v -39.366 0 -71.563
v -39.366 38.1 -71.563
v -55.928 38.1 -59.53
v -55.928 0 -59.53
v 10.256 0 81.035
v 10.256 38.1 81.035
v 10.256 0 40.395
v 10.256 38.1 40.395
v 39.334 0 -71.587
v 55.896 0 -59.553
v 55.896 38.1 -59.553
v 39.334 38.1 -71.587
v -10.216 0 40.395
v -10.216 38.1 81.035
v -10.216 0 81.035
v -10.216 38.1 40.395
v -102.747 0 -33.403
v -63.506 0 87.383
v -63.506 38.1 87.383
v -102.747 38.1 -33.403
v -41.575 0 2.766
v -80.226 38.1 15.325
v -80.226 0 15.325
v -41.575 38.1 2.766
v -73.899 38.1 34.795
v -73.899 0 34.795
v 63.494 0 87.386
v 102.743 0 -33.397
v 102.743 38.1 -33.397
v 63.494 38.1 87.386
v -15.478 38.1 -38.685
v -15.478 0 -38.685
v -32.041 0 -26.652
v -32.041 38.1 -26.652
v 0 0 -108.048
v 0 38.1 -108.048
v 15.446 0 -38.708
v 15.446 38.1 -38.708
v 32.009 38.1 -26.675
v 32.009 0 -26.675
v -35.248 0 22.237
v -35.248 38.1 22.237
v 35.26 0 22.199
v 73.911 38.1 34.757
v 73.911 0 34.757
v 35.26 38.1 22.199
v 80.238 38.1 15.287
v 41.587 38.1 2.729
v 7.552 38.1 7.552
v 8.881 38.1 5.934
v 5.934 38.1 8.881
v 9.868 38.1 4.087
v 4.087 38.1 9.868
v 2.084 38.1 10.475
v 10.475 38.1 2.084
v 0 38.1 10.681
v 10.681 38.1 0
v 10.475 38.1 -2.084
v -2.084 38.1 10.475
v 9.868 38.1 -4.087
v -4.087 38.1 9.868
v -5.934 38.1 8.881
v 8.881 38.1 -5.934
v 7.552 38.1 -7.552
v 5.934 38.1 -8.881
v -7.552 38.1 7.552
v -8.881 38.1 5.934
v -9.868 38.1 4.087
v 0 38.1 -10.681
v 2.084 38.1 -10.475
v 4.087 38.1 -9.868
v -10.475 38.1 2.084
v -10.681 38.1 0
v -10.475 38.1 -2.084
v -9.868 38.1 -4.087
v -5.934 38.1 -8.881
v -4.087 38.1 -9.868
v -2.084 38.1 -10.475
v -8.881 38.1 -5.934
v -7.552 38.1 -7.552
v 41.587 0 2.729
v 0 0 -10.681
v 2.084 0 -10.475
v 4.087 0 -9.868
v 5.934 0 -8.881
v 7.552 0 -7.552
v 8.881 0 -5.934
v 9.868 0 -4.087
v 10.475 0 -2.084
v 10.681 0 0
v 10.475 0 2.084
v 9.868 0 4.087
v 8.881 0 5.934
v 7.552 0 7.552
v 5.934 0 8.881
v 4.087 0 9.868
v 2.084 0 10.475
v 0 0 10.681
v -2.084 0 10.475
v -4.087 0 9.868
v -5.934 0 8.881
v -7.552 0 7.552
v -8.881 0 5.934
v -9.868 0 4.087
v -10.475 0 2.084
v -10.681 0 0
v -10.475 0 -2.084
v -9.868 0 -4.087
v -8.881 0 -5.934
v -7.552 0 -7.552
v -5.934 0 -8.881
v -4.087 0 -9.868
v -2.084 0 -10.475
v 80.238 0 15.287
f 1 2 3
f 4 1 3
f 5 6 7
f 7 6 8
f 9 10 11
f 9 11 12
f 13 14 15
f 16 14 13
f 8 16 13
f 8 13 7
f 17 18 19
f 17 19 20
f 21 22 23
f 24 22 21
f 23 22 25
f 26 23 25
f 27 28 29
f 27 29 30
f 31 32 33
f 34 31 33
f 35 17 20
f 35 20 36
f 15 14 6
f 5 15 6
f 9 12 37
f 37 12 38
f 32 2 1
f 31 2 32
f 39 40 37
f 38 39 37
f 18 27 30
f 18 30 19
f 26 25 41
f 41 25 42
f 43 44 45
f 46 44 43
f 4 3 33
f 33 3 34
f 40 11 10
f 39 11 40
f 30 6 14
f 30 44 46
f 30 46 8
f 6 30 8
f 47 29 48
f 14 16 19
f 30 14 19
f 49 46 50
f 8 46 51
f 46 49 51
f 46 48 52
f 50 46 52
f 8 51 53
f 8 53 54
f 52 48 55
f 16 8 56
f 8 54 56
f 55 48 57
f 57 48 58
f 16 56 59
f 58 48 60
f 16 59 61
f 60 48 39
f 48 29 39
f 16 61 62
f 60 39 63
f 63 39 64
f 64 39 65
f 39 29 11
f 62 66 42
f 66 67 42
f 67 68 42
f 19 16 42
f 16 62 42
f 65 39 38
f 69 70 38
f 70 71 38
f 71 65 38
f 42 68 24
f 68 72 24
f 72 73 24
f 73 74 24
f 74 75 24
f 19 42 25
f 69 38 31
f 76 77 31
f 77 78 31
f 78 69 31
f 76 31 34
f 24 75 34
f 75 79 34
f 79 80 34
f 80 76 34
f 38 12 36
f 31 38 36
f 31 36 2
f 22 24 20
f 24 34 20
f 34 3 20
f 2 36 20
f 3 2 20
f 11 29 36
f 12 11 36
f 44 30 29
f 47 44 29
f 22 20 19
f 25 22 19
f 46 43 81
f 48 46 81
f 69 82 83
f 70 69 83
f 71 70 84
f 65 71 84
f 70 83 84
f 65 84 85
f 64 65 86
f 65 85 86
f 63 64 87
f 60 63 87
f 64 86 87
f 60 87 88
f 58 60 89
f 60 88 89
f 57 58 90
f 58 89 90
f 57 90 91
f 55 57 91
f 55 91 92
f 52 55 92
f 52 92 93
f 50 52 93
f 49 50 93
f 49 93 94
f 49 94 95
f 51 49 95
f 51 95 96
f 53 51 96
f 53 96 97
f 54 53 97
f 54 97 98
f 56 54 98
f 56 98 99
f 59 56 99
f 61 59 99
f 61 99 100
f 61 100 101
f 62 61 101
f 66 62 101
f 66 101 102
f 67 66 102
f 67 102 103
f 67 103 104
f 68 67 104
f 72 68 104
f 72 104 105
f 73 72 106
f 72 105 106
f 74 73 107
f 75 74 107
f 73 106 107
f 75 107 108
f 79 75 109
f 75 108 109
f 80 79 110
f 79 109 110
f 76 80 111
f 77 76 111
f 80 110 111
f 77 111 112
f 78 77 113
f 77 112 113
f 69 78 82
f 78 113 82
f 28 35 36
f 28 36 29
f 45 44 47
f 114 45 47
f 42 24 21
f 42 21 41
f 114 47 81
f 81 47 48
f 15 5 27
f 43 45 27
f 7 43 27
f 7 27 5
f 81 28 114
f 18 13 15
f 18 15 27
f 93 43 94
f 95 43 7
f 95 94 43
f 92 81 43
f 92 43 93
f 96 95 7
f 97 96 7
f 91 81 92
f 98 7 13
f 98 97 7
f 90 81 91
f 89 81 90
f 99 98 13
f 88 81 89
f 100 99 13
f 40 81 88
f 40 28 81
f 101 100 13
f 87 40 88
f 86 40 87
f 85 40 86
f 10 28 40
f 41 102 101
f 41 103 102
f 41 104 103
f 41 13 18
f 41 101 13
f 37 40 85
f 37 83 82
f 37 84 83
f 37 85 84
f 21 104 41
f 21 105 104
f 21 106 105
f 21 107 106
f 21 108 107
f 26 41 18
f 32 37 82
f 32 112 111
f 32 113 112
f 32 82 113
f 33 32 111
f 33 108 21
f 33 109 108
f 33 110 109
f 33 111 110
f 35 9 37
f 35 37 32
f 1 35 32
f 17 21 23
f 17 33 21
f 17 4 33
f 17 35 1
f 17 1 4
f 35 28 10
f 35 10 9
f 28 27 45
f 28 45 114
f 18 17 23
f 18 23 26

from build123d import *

# Parameters (mm, degrees)
BOSS_EXTRUDE2_DEPTH = 38.1
SKETCH5_W           = 20.4724
SKETCH5_H           = 40.64
CUT_EXTRUDE2_DEPTH  = 154.893000964
CIRPATTERN1_COUNT   = 5
SKETCH6_R           = 10.680701414
CUT_EXTRUDE3_DEPTH  = 154.893000964


with BuildPart() as part:
    # Sketch4 → Boss-Extrude2 (new body)
    with BuildSketch(Plane(origin=(0, 0, 0), x_dir=(1, 0, 0), z_dir=(0, 1, 0))):
        Polygon((-102.747316485, 33.402541556), (0, 108.048298), (102.743, 33.396600424), (63.494349621, -87.38644244), (-63.505650326, -87.382770618), align=None)
    extrude(amount=BOSS_EXTRUDE2_DEPTH)

    # Sketch5 → Cut-Extrude2 (cut, through all)
    with BuildSketch(Plane(origin=(0, 38.1, 0), x_dir=(1, 0, 0), z_dir=(0, 1, 0))):
        with Locations((0.019749621, -60.714607261)):
            Rectangle(SKETCH5_W, SKETCH5_H)
    cut_extrude2 = extrude(amount=-CUT_EXTRUDE2_DEPTH, mode=Mode.SUBTRACT)

    # CirPattern1: Cut-Extrude2 ×5 about axis
    cirpattern1_axis = Axis((0, -1.905, 0), (0, 1, 0))
    for i in range(1, CIRPATTERN1_COUNT):
        add(cut_extrude2.rotate(cirpattern1_axis, i * 360 / CIRPATTERN1_COUNT), mode=Mode.SUBTRACT)

    # Sketch6 → Cut-Extrude3 (cut, through all)
    with BuildSketch(Plane.XZ):
        Circle(SKETCH6_R)
    extrude(amount=-CUT_EXTRUDE3_DEPTH, mode=Mode.SUBTRACT)


solid = part.part
